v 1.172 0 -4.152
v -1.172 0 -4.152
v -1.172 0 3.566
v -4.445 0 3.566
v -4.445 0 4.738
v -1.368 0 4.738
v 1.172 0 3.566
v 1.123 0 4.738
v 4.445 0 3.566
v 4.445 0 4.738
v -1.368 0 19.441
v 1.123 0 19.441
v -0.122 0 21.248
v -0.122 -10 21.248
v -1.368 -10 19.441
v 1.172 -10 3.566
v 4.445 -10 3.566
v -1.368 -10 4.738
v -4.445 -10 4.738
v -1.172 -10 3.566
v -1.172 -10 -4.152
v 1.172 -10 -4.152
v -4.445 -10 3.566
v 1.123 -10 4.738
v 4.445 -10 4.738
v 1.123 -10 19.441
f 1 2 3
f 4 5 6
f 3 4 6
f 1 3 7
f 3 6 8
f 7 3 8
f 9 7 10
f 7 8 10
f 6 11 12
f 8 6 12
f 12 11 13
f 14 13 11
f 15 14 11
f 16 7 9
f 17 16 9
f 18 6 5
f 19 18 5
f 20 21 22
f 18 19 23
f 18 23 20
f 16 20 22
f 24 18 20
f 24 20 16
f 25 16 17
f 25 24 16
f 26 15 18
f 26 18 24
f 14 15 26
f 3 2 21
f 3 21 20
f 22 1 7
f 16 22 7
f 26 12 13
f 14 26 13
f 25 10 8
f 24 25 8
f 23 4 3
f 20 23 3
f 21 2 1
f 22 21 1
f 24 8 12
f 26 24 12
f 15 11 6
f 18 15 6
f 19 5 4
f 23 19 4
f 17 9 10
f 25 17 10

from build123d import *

# Parameters (mm, degrees)
F0_W     = 2.344617017
F0_H     = 7.7176926169
F0_H_2   = 0.5861528073
F1_DEPTH = 10


with BuildPart() as f1:
    # F0 (on Front) → F1 (new body)
    with BuildSketch(Plane.XZ):
        Polygon((0, 4.7380755195), (1.1234623608, 4.7380755195), (1.1234623608, 19.4407690205), (-0.1221147261, 21.2480772879), (-1.367691813, 19.4407690205), (-1.367691813, 4.7380755195), align=None)
        Polygon((1.1723085085, 4.1519227121), (1.1723085085, 3.5657699048), (4.4450012058, 3.5657699048), (4.4450012058, 4.7380755195), (1.1234623608, 4.7380755195), (0, 4.7380755195), (-1.367691813, 4.7380755195), (-4.4450012058, 4.7380755195), (-4.4450012058, 3.5657699048), (-1.1723085085, 3.5657699048), (-1.1723085085, 4.1519227121), align=None)
        with Locations((0, -0.2930764037)):
            Rectangle(F0_W, F0_H)
        with Locations((0, 3.8588463084)):
            Rectangle(F0_W, F0_H_2)
    extrude(amount=F1_DEPTH)


solid = f1.part
